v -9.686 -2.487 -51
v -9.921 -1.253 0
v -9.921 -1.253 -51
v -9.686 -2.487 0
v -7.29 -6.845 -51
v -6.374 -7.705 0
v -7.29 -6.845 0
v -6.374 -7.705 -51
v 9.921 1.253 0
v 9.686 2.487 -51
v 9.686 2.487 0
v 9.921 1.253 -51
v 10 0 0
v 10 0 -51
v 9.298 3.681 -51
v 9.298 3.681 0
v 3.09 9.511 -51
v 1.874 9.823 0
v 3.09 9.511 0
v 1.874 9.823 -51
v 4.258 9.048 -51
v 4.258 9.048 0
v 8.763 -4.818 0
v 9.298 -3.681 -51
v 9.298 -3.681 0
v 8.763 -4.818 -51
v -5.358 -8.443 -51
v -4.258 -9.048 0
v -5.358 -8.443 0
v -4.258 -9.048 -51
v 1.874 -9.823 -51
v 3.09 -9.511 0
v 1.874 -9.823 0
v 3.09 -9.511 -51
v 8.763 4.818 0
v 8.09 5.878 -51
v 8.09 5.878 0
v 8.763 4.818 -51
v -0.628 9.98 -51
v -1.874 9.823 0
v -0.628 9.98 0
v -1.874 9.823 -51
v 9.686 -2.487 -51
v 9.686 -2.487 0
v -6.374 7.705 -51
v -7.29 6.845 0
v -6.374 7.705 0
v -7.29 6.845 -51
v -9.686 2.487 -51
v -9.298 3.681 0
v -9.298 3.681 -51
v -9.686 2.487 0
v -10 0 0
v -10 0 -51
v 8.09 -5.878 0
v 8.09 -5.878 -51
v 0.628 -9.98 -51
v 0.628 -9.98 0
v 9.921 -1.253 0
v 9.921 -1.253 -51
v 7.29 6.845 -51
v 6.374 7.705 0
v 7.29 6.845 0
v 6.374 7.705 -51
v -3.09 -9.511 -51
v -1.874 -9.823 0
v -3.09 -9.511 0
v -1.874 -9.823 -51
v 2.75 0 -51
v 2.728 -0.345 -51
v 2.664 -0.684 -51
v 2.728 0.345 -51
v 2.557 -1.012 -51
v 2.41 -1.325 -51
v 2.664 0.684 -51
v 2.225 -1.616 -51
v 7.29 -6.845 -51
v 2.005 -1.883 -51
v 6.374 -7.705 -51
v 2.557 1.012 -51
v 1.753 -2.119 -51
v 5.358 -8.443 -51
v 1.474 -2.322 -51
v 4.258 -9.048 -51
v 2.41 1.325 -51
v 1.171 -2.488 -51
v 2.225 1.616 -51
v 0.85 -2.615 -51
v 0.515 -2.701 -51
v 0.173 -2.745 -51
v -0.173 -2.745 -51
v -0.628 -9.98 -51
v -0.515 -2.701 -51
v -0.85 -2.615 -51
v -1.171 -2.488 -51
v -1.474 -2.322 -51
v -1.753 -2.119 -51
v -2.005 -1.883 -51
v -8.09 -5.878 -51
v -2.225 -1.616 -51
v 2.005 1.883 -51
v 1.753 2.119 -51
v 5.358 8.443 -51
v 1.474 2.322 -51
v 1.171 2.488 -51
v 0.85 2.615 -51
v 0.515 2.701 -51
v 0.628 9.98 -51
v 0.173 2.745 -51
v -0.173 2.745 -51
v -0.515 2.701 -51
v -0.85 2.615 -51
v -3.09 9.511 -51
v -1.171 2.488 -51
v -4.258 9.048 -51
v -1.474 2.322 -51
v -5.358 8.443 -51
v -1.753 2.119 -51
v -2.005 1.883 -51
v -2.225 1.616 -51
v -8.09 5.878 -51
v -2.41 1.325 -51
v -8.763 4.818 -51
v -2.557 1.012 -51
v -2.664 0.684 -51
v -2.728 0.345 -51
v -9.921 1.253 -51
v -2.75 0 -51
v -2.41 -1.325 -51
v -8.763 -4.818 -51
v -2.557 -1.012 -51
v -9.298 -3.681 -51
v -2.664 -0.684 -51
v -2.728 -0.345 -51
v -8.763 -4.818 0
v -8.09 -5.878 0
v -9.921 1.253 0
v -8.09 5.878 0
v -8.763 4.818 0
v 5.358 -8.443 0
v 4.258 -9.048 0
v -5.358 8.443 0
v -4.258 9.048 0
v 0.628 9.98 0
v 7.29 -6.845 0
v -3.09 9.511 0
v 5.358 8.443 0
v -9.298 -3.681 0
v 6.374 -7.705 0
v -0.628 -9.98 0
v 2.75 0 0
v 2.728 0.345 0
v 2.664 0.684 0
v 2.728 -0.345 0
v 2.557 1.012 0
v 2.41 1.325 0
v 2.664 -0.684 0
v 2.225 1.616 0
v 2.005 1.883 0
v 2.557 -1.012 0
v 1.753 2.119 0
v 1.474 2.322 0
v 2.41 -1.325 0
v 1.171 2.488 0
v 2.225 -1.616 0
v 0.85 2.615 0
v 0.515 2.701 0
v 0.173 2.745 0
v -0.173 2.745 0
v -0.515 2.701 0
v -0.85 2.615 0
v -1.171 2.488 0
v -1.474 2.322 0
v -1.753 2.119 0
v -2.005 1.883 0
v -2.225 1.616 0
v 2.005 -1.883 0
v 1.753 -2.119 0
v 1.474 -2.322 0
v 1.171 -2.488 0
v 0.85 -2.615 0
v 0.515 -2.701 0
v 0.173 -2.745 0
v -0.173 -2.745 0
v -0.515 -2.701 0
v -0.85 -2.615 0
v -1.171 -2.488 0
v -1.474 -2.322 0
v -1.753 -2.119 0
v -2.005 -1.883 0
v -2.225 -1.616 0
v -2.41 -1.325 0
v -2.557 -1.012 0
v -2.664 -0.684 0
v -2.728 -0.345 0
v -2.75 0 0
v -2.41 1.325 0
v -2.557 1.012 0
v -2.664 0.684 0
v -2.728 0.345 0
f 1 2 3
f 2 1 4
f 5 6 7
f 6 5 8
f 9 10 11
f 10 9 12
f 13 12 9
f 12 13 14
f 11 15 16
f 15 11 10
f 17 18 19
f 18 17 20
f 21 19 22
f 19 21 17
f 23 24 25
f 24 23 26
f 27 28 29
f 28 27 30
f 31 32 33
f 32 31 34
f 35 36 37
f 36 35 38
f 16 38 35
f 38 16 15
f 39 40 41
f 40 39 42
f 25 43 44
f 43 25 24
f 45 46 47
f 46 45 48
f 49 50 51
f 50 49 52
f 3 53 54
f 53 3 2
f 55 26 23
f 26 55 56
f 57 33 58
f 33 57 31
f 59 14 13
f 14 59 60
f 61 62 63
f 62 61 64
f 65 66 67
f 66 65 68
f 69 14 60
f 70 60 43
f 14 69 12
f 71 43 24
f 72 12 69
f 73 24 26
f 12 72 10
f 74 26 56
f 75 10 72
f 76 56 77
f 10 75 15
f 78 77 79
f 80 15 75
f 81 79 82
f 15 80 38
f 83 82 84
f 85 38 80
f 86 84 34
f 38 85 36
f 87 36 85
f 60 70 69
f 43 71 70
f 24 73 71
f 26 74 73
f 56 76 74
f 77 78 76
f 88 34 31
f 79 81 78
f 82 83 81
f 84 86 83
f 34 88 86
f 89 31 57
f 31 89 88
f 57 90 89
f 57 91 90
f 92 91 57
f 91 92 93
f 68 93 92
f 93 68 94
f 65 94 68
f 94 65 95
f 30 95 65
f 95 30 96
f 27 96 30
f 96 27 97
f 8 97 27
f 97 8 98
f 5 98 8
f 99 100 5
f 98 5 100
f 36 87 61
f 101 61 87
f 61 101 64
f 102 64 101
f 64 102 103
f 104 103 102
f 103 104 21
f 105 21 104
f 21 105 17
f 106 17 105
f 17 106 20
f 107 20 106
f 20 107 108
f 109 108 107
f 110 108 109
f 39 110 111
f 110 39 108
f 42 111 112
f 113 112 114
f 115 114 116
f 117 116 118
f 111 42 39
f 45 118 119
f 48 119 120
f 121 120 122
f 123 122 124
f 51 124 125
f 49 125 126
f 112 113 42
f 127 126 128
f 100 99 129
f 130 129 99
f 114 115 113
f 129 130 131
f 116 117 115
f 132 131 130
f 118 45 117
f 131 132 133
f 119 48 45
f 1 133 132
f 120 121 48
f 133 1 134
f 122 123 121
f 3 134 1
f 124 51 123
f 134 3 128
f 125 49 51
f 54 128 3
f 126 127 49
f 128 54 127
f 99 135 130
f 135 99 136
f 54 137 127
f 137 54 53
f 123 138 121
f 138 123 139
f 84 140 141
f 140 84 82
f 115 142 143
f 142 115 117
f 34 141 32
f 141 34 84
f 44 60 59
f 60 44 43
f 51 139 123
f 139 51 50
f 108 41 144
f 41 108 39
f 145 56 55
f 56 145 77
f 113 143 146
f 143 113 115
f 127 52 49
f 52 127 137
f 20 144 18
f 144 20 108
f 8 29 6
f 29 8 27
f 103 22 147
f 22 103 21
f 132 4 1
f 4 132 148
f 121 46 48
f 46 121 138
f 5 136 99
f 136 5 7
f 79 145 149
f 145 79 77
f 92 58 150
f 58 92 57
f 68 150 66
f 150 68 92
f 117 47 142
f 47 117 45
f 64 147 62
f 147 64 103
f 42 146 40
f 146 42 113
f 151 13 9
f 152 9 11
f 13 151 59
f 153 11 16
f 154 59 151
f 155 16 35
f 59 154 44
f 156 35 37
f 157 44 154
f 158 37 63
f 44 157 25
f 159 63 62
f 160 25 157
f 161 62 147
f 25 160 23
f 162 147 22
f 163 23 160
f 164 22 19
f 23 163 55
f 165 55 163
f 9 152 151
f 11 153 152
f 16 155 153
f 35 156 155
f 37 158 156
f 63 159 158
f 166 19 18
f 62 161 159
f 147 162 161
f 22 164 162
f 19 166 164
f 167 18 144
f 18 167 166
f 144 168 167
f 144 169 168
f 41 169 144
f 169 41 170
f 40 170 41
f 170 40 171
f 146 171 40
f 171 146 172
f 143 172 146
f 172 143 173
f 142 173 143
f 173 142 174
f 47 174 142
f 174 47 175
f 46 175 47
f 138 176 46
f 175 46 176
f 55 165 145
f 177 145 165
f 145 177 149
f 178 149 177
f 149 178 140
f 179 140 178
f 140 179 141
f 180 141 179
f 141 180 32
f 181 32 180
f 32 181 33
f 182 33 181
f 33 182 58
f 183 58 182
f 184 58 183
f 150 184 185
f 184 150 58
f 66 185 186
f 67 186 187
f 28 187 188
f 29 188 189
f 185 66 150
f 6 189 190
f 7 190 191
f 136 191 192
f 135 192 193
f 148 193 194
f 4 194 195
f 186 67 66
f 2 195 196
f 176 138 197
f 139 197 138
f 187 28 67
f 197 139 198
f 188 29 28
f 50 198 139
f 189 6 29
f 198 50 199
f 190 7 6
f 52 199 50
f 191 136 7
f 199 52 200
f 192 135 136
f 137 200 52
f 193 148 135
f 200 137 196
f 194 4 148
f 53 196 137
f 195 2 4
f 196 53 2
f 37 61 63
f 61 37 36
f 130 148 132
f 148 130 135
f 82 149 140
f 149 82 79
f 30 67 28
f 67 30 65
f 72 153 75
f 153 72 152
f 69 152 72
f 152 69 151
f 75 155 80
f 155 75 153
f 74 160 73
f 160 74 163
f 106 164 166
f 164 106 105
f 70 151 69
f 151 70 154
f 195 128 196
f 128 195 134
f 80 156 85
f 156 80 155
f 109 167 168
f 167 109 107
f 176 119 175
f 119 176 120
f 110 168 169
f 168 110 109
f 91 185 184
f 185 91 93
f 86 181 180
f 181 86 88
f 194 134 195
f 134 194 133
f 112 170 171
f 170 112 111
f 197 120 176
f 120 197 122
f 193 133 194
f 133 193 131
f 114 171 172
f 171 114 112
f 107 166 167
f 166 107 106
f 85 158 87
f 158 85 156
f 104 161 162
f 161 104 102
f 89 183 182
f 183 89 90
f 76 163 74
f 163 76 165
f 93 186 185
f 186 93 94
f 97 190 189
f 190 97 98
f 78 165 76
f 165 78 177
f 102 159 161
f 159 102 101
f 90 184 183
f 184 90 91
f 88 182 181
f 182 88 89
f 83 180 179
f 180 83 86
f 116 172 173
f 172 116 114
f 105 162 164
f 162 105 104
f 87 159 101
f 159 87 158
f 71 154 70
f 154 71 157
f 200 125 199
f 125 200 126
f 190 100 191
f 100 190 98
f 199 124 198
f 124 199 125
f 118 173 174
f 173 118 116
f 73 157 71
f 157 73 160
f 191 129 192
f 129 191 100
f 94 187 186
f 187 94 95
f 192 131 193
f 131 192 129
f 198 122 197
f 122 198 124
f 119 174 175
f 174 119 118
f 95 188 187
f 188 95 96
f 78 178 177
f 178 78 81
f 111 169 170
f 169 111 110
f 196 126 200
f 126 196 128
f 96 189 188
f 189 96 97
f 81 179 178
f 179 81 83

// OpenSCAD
$fn = 50;


difference() {
	union() {
		translate(v = [0, 0, -51.0000000000]) {
			cylinder(h = 51, r = 10.0000000000);
		}
		cylinder(h = 0, r = 19.0000000000);
	}
	union() {
		#translate(v = [0, 0, -51]) {
			cylinder(h = 51, r = 2.7500000000);
		}
	}
}
